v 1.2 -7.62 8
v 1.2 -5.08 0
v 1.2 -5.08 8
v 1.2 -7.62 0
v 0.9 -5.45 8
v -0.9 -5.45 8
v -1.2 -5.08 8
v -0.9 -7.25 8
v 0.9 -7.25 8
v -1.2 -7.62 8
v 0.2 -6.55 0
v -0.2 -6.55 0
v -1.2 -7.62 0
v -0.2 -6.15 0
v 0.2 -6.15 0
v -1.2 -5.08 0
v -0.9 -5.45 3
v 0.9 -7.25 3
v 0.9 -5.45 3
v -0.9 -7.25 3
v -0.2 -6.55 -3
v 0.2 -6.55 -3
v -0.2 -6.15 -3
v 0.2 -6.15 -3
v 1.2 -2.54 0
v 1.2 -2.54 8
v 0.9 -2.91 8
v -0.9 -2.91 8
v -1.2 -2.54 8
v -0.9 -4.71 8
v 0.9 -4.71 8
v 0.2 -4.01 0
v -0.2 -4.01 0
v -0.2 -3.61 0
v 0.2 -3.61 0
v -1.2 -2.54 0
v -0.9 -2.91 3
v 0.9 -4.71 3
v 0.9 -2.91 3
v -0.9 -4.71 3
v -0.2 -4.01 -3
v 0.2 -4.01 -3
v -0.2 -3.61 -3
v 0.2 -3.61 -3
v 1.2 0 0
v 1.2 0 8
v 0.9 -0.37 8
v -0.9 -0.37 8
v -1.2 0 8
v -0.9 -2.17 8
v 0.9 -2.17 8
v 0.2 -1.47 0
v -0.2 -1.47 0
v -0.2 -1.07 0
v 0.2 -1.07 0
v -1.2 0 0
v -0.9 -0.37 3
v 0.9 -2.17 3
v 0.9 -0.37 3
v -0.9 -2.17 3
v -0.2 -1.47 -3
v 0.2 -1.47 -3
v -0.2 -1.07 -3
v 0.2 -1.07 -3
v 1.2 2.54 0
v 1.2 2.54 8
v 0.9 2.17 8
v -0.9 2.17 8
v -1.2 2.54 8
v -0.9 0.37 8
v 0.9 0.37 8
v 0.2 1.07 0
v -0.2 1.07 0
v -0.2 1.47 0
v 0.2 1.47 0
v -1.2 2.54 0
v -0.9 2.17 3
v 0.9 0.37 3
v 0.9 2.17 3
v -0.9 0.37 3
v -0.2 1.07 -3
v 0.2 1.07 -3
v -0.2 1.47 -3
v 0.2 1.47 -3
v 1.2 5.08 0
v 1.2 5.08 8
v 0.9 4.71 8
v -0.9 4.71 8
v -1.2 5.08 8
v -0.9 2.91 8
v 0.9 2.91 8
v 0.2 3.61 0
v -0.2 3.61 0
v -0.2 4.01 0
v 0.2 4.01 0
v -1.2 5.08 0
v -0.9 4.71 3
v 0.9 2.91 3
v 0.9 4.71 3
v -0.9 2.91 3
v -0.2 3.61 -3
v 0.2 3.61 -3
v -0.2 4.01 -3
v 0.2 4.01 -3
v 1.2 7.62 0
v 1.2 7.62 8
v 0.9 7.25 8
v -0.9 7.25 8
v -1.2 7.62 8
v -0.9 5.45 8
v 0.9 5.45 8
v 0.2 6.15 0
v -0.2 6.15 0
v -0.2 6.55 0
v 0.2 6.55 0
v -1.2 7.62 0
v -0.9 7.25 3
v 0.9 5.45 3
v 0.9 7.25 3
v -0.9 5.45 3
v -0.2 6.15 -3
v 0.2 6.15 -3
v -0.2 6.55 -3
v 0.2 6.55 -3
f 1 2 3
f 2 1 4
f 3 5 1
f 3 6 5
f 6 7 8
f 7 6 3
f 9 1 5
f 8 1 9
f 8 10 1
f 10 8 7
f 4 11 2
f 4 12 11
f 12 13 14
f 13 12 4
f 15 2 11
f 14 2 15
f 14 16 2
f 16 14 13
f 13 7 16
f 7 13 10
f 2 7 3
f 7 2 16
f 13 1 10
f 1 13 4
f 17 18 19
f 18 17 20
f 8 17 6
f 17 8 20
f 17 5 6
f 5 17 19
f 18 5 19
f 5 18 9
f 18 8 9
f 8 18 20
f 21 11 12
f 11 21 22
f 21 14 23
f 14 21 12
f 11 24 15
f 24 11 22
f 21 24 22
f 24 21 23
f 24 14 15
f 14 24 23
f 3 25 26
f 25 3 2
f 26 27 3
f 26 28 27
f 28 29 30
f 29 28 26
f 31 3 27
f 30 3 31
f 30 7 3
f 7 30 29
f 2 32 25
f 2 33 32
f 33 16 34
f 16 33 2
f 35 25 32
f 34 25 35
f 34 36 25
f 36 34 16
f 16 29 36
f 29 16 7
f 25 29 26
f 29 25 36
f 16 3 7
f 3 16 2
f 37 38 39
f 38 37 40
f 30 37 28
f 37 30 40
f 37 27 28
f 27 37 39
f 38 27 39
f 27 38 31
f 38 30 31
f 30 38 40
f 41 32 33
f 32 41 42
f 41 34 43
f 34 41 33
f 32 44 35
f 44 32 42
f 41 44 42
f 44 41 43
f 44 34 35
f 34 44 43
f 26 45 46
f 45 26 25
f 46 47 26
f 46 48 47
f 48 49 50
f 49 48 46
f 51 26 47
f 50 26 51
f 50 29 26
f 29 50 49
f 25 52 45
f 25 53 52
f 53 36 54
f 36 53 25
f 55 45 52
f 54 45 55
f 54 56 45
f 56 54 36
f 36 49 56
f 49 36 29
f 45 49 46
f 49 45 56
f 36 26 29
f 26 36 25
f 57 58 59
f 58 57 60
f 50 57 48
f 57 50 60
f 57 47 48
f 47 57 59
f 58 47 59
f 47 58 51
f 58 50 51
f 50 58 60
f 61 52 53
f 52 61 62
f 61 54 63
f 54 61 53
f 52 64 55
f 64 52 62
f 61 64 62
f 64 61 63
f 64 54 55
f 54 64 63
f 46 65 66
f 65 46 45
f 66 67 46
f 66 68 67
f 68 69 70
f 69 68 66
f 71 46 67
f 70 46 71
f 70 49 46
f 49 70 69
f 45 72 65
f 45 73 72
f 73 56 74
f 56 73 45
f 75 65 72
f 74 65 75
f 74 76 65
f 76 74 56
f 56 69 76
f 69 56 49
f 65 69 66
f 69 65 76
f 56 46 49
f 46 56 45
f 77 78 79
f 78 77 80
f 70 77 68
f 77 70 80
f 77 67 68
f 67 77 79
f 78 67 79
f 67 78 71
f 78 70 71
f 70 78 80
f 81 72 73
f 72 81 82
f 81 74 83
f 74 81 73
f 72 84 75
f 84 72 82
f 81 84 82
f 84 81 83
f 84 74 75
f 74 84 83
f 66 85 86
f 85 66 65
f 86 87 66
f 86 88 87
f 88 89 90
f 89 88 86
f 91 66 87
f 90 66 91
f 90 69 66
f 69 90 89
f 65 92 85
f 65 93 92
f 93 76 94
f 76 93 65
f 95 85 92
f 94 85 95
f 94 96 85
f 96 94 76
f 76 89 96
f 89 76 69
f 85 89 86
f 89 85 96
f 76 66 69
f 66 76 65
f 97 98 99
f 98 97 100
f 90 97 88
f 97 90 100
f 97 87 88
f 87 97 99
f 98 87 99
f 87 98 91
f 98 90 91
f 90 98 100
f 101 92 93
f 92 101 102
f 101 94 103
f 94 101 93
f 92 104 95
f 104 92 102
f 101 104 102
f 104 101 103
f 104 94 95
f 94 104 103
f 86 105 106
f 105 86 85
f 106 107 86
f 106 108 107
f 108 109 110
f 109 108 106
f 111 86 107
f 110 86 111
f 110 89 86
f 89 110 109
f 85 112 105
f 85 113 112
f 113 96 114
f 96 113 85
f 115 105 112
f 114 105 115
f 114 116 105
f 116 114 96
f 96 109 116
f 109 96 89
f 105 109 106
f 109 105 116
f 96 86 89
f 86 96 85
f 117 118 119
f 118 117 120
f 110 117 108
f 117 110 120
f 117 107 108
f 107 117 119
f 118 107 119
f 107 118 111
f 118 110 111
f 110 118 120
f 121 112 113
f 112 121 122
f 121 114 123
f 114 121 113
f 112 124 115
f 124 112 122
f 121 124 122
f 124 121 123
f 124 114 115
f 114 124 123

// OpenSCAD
$fa = 1;
$fs = 0.04;

pin_count = 6;

step = 2.54;

body_color = [0.1,0.1,0.1];

body_width = 2.4;
body_height = 8;

hole_color = [0.4,0.4,0.4];
hole_width = 1.8;
hole_depth = 5;

pin_color = [0.9,0.9,0.9];
pin_height = 3;
pin_width = 0.4;

// centered pin
module pin() {
    difference() {
        color(body_color)
            translate([-body_width/2,-step/2,0])
                cube([body_width,step,body_height]);
        color(hole_color)
            translate([-hole_width/2,-hole_width/2,body_height-hole_depth])
                linear_extrude(height = hole_depth+0.1)
                    square(hole_width);
    }
    color(pin_color)
        rotate([180,0,0])
        linear_extrude(height = pin_height)
            square(pin_width,center=true);

}

module raw(pin_count) {
    for(i=[0:1:pin_count-1]) {
        translate([0,step * (i - (pin_count-1)/2),0])
        pin();
    }
}

raw(pin_count);
